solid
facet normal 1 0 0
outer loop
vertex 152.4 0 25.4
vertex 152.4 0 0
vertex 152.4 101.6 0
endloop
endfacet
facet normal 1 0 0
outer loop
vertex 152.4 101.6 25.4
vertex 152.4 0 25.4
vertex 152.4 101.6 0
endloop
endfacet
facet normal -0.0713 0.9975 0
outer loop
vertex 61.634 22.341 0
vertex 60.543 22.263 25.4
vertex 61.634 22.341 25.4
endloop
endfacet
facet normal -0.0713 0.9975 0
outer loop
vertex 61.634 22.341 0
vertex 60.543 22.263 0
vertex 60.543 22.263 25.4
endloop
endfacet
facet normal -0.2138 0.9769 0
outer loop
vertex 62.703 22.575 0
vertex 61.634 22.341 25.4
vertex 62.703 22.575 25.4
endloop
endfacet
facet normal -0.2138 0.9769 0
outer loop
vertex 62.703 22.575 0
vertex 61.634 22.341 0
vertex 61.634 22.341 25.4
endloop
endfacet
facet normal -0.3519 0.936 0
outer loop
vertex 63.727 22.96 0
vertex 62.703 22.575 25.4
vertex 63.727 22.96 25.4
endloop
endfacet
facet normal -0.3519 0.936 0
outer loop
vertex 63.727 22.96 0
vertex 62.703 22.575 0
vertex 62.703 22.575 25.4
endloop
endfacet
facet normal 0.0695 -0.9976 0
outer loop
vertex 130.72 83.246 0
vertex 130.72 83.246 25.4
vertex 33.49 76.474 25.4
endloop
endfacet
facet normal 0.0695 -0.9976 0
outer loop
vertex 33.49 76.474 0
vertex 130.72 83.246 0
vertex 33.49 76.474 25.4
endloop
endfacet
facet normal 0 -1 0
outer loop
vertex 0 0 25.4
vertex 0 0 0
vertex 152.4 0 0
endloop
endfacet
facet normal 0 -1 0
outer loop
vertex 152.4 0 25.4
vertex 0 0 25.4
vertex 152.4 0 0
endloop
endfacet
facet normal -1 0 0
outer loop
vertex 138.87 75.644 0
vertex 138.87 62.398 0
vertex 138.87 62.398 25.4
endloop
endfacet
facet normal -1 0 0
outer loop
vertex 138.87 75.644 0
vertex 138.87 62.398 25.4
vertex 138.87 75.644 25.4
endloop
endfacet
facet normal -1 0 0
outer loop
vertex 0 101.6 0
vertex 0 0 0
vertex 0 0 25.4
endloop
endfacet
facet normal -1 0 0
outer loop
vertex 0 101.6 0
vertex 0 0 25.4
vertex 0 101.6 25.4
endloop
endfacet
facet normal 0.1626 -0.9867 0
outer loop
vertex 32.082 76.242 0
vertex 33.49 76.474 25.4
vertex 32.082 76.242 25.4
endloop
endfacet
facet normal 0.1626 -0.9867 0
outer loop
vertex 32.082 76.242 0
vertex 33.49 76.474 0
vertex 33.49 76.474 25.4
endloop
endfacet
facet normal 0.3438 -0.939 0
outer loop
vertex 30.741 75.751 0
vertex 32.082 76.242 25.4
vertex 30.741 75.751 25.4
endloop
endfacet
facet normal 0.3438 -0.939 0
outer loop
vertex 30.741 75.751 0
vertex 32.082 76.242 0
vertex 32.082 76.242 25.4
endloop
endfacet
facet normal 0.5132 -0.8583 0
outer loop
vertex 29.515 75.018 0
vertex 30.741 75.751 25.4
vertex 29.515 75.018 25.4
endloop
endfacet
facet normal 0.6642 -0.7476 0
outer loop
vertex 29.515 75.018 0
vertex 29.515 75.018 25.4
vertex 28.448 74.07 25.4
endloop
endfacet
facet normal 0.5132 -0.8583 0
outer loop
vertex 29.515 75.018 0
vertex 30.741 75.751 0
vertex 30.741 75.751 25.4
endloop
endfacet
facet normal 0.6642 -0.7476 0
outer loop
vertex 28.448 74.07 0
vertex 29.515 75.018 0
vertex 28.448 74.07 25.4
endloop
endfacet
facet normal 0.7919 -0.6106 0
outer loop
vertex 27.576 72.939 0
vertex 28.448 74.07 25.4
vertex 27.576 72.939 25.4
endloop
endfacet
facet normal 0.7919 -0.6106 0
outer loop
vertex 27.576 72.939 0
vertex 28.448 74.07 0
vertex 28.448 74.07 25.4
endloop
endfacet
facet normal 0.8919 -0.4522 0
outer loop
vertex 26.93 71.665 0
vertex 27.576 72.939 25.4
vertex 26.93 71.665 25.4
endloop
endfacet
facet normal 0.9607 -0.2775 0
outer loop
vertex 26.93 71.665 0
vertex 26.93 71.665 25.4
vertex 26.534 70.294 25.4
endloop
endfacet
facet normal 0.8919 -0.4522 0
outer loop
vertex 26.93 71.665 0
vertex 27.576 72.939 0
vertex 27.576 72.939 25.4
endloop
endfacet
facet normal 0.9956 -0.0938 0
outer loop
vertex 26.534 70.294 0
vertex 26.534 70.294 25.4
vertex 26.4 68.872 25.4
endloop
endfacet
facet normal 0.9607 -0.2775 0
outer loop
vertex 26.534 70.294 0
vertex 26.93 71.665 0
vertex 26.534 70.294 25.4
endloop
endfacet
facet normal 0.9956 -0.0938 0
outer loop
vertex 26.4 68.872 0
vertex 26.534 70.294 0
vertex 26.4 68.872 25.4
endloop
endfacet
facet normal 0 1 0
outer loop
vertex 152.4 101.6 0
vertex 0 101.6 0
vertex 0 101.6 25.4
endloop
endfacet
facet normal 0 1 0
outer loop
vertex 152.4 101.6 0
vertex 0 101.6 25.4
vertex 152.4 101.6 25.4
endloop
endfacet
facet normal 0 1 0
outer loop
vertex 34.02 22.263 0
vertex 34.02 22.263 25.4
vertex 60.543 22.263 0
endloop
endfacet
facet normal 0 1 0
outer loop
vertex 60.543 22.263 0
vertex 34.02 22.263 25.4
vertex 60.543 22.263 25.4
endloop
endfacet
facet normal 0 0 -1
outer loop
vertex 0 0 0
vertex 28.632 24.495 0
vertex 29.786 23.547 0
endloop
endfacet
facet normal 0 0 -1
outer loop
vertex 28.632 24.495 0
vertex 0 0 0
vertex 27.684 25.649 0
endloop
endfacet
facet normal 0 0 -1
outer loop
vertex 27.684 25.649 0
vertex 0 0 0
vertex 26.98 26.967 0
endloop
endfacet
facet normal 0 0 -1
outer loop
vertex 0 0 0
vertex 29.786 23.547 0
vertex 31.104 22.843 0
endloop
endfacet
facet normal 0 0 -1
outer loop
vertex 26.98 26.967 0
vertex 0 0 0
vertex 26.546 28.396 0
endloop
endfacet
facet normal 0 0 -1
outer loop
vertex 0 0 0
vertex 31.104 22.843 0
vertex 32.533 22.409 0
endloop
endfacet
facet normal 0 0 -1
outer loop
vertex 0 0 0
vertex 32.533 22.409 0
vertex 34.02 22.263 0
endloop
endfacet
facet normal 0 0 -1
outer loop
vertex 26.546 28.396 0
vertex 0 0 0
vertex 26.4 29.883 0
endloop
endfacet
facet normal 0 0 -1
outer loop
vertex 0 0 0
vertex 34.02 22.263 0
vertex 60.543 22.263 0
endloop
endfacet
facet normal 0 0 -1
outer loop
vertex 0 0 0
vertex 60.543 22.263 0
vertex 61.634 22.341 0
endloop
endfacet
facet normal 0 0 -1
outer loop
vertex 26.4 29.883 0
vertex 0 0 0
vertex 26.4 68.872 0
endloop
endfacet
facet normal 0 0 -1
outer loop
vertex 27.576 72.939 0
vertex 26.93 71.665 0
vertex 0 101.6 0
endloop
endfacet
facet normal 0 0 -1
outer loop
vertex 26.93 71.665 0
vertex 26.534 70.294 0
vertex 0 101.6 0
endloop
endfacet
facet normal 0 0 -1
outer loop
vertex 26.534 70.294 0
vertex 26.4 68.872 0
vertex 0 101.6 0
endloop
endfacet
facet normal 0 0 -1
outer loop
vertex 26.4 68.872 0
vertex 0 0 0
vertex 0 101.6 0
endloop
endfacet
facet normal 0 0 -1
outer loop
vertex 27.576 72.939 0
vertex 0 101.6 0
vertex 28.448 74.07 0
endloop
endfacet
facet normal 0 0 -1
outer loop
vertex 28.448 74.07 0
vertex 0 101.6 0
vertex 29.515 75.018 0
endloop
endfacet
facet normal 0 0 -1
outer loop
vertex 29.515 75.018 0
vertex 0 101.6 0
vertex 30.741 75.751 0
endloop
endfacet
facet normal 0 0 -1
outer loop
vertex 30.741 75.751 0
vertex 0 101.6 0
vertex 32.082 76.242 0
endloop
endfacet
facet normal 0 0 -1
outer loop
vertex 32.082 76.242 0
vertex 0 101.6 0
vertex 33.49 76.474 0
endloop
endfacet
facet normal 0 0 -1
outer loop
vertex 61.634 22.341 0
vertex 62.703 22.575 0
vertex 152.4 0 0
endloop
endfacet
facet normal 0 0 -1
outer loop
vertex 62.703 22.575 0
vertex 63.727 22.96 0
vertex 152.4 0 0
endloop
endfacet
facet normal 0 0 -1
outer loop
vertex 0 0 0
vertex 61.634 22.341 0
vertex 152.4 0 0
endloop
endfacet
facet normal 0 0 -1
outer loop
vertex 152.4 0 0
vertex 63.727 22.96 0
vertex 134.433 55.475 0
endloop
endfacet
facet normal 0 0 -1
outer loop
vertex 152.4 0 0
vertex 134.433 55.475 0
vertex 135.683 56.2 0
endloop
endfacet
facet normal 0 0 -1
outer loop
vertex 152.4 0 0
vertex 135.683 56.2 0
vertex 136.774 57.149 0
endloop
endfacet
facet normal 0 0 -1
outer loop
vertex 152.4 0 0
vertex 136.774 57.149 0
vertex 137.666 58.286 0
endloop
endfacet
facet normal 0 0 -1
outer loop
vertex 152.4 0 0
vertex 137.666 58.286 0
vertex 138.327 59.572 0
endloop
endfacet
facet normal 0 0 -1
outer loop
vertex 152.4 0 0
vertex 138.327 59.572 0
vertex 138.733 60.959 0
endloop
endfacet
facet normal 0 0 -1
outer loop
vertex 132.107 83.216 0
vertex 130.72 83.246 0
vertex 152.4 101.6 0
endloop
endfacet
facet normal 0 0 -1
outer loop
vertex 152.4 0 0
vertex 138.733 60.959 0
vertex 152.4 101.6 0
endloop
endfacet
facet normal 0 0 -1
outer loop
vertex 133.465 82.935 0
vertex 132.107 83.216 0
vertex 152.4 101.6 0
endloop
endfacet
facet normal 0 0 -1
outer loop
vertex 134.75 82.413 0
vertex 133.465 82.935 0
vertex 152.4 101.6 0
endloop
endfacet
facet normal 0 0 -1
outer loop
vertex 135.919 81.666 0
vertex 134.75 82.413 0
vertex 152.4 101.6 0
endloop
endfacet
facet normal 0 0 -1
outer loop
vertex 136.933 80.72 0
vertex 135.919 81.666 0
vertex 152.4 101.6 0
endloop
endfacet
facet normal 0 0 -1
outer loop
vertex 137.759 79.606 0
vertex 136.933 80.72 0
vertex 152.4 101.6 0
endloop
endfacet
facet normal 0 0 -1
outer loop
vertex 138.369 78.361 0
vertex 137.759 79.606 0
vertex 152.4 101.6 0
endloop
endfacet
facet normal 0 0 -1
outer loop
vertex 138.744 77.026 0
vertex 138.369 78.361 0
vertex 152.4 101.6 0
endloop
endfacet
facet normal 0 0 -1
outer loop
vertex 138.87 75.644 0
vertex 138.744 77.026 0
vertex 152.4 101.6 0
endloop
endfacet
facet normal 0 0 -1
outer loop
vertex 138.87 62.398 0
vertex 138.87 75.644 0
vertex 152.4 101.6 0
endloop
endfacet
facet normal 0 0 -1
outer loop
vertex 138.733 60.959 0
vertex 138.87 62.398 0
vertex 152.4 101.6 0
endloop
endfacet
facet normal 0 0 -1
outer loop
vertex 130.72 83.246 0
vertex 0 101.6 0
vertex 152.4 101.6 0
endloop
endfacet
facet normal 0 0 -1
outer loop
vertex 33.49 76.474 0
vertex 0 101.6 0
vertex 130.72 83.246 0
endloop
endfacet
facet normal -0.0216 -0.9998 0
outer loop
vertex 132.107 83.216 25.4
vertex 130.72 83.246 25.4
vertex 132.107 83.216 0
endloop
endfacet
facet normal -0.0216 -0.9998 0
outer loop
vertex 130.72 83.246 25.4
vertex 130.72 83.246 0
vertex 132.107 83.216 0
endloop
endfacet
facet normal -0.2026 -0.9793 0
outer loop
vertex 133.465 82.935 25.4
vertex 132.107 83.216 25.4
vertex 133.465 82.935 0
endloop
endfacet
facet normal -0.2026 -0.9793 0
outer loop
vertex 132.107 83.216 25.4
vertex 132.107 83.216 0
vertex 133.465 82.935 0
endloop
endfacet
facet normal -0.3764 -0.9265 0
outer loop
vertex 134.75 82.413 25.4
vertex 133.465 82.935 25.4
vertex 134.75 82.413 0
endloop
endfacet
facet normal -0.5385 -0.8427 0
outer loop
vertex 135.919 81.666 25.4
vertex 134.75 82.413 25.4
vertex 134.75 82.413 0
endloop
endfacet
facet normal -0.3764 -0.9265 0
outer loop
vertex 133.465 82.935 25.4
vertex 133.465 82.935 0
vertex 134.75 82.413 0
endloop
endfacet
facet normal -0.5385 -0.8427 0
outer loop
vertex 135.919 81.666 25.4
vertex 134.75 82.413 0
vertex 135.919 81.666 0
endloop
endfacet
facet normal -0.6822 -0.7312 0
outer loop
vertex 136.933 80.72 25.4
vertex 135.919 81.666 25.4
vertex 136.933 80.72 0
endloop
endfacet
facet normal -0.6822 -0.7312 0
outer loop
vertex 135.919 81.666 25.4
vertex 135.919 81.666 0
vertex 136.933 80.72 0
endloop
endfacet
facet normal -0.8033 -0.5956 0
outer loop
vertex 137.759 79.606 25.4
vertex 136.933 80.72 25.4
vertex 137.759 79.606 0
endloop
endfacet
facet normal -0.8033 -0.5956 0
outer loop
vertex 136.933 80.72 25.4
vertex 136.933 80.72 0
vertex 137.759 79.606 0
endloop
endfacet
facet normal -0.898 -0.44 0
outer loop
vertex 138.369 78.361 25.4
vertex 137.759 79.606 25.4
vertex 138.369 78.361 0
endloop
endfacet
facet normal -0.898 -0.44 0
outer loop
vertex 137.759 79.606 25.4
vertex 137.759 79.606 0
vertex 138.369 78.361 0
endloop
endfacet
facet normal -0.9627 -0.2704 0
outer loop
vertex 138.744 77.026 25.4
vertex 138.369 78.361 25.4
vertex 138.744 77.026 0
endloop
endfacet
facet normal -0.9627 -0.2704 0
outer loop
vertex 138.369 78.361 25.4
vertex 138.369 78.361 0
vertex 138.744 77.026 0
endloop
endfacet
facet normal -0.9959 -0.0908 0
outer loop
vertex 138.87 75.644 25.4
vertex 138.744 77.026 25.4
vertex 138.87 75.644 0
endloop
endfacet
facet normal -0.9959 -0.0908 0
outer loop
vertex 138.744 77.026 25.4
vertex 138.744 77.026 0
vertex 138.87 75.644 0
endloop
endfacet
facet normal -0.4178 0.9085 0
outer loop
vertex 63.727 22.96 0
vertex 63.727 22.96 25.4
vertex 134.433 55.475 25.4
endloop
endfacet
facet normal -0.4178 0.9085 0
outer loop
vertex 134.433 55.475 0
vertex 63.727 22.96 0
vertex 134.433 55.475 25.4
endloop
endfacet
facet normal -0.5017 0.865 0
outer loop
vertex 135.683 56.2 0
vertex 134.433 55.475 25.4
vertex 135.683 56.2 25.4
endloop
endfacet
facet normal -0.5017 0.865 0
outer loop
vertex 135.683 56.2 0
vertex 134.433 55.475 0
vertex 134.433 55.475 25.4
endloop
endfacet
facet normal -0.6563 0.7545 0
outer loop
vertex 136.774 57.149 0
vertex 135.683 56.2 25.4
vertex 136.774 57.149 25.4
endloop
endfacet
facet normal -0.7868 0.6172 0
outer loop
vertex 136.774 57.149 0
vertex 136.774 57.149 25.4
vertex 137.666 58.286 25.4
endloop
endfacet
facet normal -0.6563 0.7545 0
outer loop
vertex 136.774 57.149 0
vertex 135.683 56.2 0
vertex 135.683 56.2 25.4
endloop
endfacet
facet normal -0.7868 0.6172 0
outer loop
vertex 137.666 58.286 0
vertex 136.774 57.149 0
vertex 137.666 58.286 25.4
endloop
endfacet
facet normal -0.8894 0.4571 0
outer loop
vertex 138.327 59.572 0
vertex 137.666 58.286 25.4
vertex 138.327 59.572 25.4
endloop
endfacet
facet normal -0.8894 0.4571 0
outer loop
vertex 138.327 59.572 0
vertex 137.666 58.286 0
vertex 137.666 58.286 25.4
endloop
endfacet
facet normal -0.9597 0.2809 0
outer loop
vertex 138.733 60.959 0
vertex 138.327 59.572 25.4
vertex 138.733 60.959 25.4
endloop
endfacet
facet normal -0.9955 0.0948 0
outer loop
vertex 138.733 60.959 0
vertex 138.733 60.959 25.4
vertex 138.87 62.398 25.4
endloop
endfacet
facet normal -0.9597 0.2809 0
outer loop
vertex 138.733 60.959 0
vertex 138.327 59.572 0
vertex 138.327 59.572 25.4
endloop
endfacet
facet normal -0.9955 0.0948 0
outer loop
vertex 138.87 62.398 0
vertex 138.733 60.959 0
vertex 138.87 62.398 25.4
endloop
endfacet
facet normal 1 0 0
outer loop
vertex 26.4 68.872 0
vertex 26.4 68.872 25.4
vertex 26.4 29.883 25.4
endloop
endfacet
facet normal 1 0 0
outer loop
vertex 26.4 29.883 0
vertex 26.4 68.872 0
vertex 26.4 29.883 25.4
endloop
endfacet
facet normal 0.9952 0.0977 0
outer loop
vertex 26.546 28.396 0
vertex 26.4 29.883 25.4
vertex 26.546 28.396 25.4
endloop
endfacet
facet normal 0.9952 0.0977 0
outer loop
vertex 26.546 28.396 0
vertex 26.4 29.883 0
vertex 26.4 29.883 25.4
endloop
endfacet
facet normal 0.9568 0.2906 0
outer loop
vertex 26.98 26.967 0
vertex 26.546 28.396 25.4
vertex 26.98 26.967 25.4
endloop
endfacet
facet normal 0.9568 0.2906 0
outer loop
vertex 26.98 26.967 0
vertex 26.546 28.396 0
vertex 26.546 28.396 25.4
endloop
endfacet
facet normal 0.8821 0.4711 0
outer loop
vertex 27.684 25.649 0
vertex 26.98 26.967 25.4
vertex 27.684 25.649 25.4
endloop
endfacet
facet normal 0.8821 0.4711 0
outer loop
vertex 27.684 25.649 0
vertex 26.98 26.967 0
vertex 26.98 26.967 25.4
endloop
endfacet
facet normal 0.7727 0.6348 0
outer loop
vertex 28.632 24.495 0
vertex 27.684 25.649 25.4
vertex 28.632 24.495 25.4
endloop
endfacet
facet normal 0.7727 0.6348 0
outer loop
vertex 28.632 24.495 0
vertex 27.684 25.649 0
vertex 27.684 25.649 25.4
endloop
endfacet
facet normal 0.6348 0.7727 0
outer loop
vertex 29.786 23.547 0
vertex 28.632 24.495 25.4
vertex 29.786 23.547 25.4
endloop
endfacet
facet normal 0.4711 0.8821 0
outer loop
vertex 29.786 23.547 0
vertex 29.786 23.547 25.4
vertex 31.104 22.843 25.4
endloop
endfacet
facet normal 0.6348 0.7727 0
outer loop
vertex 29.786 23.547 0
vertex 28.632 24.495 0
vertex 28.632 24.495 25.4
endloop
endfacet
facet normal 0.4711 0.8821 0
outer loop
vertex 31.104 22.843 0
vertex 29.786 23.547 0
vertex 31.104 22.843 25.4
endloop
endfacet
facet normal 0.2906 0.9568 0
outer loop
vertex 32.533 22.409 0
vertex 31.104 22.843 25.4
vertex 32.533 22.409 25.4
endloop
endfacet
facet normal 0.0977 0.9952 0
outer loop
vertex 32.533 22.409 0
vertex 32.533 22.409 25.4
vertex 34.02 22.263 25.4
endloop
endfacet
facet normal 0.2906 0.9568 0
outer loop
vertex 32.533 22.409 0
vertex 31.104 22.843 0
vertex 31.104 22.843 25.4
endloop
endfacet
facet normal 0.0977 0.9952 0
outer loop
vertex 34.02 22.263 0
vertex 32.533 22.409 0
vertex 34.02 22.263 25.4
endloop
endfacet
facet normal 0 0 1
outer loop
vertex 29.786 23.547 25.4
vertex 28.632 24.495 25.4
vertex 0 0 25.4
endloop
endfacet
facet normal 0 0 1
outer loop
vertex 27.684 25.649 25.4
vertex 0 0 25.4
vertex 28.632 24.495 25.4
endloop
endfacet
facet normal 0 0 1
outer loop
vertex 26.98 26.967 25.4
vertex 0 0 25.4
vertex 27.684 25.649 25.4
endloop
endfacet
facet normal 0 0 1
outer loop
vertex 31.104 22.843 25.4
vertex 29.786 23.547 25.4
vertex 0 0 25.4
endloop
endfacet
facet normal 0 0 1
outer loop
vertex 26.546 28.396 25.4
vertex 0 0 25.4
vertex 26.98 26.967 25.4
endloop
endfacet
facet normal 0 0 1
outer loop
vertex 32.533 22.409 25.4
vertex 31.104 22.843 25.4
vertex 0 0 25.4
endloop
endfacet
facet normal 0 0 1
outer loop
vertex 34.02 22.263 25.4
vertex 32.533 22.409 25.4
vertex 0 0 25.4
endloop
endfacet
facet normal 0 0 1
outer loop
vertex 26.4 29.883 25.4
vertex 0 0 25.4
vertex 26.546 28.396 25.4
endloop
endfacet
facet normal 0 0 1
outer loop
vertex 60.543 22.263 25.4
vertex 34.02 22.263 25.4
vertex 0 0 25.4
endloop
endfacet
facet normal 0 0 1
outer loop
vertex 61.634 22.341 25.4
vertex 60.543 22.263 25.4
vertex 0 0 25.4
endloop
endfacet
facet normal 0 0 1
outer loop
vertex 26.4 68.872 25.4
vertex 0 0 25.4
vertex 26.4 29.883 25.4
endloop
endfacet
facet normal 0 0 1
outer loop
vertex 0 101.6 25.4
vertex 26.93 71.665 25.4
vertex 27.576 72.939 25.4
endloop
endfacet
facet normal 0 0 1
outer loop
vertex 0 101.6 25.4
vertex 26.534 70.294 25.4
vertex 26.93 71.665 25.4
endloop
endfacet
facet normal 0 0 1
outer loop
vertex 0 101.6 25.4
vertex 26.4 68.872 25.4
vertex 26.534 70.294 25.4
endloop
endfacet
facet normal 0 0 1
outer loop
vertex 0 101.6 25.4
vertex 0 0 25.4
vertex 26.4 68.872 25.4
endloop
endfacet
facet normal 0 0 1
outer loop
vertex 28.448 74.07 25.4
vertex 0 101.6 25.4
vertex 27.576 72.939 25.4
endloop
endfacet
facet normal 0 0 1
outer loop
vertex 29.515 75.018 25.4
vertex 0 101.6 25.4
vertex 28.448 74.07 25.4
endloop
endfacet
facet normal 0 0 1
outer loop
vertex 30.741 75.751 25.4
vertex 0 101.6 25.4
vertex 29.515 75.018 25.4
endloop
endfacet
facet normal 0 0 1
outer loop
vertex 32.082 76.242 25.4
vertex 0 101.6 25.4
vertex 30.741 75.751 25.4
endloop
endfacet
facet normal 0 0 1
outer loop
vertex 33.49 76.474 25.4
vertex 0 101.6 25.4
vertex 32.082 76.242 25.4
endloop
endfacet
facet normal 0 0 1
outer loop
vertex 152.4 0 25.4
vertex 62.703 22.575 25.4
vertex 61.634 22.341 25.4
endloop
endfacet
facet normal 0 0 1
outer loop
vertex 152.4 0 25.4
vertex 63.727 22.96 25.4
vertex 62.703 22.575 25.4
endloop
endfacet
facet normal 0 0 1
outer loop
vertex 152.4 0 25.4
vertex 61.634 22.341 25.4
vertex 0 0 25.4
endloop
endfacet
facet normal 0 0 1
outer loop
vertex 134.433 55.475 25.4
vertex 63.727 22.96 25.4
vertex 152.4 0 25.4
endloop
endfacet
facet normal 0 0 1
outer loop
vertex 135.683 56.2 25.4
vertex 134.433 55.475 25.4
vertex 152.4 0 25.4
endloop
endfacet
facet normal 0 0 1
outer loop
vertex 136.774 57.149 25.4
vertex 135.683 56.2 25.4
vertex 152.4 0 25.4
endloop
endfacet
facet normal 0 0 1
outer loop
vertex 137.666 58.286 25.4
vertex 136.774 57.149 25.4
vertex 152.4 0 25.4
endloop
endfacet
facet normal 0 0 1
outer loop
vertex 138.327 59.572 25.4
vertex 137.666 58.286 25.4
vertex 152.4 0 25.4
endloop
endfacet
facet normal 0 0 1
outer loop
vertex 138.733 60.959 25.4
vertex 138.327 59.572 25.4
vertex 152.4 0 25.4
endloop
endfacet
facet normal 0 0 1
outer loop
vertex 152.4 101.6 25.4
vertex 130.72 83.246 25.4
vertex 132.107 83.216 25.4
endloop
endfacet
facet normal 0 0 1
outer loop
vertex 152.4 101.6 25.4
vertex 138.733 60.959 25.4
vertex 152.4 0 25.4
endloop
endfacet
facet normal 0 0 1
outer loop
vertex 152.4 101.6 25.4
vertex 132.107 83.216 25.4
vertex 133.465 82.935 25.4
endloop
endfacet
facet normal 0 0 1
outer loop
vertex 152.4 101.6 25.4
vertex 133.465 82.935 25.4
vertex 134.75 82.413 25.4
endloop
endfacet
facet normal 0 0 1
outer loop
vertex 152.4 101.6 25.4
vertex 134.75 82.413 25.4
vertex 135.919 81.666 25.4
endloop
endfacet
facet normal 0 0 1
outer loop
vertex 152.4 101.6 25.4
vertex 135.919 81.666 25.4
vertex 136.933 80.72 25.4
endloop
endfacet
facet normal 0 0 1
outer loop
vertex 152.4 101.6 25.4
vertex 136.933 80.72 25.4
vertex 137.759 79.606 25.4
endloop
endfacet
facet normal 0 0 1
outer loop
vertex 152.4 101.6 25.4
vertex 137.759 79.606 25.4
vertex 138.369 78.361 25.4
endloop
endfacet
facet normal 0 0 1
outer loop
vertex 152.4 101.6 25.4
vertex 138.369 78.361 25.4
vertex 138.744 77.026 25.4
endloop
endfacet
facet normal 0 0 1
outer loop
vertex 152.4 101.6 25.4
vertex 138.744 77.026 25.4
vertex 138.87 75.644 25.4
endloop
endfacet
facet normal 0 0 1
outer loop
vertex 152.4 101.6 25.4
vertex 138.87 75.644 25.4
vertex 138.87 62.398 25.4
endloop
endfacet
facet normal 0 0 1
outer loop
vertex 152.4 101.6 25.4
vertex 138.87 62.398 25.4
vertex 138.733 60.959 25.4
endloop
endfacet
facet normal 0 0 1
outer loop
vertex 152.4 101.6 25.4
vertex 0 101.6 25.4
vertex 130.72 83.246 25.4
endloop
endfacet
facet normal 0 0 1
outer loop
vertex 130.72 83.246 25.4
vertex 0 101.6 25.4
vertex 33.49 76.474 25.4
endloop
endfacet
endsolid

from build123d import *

# Parameters (mm, degrees)
F0_W     = 152.4
F0_H     = 101.6
F1_DEPTH = 25.4
F3_DEPTH = 25.4
F4_R     = 7.62


with BuildPart() as f1:
    # F0 (on Top) → F1 (new body)
    with BuildSketch(Plane.XY):
        with Locations((76.2, 50.8)):
            Rectangle(F0_W, F0_H)
    extrude(amount=F1_DEPTH)

    # F2 (on face) → F3 (cut)
    with BuildSketch(Plane.XY.offset(25.4)):
        Polygon((138.869882, 83.813608), (26.399821, 75.979866), (26.399821, 22.262821), (62.211186, 22.262821), (138.869882, 57.514634), align=None)
    extrude(amount=-F3_DEPTH, mode=Mode.SUBTRACT)

    # F4
    f4_edges = [f1.edges().sort_by_distance(p)[0] for p in [
        (26.399821, 75.979866, 12.7),
        (26.399821, 22.262821, 12.7),
        (62.211186, 22.262821, 12.7),
        (138.869882, 57.514634, 12.7),
        (138.869882, 83.813608, 12.7),
    ]]
    fillet(f4_edges, radius=F4_R)


solid = f1.part
